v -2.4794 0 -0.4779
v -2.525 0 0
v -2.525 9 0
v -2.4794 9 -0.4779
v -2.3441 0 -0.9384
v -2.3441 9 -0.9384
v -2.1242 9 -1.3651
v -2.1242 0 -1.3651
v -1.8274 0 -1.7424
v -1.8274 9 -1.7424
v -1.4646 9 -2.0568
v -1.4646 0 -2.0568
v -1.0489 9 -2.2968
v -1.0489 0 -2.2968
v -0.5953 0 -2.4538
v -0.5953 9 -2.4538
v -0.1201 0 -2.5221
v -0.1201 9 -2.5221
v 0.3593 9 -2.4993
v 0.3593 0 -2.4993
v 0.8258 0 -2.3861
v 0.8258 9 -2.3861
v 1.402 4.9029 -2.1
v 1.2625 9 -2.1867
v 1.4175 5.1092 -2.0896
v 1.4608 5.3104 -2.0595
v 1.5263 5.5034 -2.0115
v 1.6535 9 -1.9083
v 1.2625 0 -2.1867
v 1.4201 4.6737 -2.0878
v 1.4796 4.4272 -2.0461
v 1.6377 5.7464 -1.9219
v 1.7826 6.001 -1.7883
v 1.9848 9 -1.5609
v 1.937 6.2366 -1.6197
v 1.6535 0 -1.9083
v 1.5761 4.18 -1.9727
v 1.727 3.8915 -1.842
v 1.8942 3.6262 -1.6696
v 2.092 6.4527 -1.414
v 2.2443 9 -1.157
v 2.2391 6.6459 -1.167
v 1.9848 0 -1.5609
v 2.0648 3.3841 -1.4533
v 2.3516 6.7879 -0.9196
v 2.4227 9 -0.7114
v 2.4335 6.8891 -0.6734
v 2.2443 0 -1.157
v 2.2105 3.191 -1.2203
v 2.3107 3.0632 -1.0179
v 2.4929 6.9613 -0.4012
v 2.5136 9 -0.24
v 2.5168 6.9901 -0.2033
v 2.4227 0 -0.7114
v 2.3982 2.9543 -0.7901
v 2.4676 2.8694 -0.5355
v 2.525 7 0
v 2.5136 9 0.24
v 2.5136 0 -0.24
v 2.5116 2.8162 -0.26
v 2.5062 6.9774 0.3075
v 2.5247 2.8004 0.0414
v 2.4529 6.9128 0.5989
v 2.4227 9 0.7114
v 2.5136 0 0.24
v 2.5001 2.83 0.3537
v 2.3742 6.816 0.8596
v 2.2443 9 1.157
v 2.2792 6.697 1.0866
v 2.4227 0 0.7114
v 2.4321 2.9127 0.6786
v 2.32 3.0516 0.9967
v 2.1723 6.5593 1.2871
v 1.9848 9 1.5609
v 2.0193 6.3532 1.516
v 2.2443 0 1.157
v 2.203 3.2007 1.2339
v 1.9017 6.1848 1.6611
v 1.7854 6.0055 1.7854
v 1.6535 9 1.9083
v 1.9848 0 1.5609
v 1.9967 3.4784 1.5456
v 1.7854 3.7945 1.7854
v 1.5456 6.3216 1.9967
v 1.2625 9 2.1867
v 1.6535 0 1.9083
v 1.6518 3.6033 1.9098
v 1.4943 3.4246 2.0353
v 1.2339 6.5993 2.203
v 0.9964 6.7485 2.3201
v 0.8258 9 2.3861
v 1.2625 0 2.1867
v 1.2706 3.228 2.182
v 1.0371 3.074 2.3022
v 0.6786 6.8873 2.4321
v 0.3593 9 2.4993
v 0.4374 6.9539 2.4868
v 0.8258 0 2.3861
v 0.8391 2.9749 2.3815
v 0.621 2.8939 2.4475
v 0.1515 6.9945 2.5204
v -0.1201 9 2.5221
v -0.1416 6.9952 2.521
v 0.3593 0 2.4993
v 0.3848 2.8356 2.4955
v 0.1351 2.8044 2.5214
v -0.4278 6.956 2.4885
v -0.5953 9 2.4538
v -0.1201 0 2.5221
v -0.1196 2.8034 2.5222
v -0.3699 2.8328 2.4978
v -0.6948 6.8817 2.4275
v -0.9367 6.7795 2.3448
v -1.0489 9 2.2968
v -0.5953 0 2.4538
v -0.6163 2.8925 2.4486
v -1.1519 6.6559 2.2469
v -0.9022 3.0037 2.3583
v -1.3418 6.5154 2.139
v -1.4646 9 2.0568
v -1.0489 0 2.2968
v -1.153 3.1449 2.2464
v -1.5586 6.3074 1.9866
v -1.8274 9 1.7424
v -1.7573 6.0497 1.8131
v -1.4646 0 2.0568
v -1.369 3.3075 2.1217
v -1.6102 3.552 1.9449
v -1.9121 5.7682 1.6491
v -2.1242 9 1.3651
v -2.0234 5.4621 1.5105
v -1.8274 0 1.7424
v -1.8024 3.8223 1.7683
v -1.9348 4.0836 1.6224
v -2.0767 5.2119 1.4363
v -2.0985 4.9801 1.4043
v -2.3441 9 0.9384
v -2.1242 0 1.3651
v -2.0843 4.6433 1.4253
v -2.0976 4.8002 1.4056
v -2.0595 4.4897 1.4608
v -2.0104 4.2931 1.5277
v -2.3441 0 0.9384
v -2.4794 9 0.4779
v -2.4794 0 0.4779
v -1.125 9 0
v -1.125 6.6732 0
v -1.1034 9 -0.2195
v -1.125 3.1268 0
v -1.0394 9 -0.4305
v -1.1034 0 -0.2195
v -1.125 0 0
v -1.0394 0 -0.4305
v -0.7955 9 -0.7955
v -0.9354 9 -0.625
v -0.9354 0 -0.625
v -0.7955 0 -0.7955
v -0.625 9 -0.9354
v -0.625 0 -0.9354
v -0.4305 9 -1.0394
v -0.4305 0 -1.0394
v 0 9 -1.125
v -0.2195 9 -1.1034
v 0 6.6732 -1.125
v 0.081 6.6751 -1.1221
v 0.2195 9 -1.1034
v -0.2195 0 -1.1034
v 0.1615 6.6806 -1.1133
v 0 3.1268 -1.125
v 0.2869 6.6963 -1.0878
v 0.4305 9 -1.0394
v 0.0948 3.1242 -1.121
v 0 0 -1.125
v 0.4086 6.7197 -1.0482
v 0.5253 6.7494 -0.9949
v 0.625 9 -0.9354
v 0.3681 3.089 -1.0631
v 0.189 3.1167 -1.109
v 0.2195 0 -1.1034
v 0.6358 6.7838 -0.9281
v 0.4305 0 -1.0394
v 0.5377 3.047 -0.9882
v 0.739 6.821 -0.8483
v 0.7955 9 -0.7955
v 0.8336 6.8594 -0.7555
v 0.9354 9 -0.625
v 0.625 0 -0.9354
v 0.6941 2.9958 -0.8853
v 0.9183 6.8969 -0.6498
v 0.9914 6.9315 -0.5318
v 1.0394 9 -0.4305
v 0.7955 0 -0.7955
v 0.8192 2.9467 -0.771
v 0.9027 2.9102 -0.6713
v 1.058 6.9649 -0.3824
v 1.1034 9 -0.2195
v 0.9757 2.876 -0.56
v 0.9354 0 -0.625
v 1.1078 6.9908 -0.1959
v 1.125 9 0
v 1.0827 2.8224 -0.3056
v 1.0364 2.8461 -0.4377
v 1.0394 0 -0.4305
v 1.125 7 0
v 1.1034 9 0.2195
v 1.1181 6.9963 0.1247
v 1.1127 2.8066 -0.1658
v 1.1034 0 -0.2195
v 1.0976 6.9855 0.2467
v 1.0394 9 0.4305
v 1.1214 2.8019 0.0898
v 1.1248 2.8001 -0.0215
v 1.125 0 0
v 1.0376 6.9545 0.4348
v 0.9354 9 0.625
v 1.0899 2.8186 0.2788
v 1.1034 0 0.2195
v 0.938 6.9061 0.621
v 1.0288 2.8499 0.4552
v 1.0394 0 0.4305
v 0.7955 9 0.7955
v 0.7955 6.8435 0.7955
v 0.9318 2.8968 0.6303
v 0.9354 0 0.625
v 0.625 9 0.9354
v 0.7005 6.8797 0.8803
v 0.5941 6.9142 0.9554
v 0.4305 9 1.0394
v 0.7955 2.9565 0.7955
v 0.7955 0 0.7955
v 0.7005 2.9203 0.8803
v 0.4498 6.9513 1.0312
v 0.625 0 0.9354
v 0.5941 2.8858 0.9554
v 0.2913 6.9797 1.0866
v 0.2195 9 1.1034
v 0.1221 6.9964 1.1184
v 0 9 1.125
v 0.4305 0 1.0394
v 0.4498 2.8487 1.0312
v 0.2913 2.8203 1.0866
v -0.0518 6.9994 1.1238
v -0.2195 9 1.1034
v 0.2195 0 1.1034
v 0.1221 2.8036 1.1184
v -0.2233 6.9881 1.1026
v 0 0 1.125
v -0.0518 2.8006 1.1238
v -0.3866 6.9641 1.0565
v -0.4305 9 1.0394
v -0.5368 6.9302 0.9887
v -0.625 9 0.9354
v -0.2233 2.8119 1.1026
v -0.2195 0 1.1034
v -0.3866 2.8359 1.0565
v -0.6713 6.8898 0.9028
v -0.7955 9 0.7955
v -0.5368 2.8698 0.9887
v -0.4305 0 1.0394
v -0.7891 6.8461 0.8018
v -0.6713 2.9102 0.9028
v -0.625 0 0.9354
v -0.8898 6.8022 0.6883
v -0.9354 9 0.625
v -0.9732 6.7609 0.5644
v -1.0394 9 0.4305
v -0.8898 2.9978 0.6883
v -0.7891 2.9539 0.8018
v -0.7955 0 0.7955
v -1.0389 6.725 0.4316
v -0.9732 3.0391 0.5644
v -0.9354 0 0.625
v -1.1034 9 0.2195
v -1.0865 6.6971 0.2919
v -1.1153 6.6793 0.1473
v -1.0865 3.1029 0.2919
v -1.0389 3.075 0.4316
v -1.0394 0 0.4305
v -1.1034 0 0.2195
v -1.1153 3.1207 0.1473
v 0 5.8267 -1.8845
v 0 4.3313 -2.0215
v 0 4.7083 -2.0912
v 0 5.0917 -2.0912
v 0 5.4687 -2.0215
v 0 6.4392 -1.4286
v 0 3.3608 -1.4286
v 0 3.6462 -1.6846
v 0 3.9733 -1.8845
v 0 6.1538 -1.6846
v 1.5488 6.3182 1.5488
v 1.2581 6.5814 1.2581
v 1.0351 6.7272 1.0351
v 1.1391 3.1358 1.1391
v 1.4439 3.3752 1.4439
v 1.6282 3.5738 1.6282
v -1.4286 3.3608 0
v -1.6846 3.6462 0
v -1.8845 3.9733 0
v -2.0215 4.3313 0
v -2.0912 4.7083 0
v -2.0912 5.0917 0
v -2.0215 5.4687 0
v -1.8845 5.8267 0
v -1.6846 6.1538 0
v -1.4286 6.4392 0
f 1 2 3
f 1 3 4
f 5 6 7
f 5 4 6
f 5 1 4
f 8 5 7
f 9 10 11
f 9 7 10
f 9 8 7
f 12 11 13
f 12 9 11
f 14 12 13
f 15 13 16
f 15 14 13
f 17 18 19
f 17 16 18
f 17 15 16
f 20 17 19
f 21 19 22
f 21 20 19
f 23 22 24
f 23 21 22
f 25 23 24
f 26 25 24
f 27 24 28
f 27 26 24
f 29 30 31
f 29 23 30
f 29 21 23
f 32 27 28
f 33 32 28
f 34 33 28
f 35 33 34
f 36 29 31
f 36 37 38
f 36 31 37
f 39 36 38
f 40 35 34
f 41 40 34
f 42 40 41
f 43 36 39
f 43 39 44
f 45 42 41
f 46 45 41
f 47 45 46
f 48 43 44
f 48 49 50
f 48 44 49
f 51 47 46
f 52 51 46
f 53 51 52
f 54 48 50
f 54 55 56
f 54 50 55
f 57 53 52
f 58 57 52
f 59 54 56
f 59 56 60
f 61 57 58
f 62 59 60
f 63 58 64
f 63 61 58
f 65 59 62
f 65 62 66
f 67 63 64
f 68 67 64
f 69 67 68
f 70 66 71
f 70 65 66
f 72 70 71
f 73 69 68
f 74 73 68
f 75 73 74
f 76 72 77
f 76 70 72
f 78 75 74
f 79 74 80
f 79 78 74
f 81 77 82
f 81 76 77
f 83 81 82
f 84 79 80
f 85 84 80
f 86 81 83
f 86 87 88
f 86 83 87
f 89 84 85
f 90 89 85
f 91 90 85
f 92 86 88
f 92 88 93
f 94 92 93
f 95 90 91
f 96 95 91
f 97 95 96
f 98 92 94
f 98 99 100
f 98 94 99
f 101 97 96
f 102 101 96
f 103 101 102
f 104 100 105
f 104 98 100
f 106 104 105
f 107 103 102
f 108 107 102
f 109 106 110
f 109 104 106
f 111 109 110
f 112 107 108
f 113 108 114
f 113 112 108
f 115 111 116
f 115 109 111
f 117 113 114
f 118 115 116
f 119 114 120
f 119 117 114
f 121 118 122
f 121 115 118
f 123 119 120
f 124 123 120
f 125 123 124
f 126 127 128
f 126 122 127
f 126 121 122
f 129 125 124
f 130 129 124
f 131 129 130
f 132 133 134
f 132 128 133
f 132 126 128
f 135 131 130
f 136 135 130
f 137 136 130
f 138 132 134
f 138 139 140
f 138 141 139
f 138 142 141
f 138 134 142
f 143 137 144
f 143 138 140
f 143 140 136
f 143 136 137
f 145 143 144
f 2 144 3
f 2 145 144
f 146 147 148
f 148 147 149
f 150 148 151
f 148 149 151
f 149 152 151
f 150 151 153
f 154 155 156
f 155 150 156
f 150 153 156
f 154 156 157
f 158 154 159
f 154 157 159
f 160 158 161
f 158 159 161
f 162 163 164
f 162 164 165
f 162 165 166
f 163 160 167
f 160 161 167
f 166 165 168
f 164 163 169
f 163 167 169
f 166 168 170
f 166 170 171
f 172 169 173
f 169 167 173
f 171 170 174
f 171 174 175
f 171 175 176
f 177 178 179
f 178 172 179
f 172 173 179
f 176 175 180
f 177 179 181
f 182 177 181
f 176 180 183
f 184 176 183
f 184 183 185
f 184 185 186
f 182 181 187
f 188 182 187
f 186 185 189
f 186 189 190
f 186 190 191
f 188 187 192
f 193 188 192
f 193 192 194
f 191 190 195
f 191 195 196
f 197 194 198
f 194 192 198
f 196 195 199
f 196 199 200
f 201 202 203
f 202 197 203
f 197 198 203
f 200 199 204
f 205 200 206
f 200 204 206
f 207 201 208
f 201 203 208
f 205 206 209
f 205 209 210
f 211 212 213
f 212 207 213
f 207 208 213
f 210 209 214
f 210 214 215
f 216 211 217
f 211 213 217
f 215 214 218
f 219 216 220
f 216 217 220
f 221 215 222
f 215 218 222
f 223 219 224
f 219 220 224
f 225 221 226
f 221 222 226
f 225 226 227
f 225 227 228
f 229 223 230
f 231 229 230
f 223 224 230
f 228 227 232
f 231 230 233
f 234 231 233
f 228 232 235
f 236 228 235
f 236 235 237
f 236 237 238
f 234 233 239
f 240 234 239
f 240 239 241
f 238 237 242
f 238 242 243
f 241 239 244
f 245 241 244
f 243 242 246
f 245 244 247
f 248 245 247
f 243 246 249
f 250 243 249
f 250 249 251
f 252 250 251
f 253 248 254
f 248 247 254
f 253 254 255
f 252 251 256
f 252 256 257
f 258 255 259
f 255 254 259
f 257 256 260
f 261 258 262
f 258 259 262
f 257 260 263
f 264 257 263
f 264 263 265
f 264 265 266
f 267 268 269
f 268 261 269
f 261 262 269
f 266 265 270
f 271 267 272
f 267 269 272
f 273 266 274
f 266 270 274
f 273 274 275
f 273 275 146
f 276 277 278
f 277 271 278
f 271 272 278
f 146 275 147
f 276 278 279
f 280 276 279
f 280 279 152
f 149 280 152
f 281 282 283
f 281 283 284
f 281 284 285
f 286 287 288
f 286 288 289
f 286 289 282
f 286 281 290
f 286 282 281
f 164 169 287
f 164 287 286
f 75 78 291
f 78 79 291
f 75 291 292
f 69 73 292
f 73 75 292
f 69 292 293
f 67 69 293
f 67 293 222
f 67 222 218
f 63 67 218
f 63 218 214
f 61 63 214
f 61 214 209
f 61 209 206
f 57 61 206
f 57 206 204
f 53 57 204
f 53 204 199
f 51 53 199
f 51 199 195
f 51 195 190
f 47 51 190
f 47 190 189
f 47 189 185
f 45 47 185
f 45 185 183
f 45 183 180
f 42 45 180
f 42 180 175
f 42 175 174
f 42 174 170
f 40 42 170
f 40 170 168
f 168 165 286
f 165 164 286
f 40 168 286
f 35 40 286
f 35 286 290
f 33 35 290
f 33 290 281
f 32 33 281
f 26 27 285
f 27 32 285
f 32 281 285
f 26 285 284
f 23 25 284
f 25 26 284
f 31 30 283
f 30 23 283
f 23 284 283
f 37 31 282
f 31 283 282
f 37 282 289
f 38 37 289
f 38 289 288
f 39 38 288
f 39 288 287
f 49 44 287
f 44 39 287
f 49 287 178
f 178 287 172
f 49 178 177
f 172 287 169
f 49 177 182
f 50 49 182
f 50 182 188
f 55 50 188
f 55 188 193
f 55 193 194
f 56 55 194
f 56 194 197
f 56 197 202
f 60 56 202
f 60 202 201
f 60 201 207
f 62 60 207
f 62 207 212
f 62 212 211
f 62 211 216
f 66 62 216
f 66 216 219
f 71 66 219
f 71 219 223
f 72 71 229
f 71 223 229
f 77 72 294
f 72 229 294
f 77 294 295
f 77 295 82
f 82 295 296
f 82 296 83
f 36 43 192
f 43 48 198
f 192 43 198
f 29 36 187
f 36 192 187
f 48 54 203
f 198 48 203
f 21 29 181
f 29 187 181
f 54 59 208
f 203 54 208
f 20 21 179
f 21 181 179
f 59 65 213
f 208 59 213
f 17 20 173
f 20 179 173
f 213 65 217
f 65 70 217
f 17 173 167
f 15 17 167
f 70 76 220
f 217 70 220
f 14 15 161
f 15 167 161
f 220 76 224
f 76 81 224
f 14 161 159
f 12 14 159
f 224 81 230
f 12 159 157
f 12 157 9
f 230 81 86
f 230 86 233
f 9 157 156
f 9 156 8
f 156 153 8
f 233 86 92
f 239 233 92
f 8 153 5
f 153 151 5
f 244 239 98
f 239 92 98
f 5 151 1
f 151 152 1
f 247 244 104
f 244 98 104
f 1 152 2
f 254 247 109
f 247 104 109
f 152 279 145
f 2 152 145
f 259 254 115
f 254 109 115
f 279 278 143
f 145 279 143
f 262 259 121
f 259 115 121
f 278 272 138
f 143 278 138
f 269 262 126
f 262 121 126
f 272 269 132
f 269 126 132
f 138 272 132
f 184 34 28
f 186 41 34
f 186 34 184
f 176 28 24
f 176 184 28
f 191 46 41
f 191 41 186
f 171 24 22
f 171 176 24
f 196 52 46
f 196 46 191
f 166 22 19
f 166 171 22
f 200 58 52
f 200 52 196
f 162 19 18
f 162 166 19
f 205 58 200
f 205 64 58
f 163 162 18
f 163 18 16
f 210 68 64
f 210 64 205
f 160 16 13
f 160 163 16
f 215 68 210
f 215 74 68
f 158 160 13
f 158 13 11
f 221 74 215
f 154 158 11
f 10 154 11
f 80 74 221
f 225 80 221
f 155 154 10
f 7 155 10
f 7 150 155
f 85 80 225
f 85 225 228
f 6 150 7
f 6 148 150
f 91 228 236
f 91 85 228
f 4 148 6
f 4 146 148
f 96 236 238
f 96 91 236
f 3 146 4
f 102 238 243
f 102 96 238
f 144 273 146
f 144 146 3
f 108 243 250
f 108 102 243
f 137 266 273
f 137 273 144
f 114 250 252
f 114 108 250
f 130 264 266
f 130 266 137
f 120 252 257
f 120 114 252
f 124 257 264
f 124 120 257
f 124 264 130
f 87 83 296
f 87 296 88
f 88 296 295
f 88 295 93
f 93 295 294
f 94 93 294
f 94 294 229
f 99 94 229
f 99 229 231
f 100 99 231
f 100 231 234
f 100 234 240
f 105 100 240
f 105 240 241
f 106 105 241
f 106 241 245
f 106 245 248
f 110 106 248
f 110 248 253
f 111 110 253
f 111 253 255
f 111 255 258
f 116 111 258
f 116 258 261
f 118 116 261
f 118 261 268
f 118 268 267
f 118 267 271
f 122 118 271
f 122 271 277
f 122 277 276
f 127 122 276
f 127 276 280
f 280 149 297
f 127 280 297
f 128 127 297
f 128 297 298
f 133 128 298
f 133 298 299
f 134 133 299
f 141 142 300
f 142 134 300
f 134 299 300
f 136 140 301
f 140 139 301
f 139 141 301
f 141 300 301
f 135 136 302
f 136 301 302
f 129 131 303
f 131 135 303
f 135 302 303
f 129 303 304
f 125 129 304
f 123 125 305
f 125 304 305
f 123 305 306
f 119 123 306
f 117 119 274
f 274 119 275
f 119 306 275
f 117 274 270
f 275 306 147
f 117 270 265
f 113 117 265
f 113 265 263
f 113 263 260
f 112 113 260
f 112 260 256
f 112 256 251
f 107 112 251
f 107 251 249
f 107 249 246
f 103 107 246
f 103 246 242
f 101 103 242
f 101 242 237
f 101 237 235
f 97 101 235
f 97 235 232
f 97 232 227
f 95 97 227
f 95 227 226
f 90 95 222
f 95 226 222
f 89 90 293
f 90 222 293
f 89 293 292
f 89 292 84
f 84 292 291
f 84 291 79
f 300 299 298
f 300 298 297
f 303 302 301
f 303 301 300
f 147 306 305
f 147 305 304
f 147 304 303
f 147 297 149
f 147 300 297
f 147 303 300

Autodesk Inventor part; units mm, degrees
ref_plane "YZ Plane" through (0, 0, 0) normal (1, 0, 0) x (0, 1, 0)
ref_plane "XZ Plane" through (0, 0, 0) normal (0, 1, 0) x (-1, 0, 0)
ref_plane "XY Plane" through (0, 0, 0) normal (0, 0, 1) x (1, 0, 0)
sketch "Sketch1" plane through (0, 0, 0) normal (0, 1, 0) x (-1, 0, 0)
  circle A0 centre (0, 0) radius 1.125
  circle A1 centre (0, 0) radius 2.525
  dimension "d0" = 2.25
  dimension "d1" = 5.05
extrude "Extrusion1" add sketch "Sketch1" along normal blind 9
sketch "Sketch2" plane through (0, 0, 0) normal (0, 0, 1) x (1, 0, 0)
  line L0 (2.525, 9) -> (-2.525, 9) projected
  line L1 (2.525, 0) -> (-2.525, 0) projected
  line L2 (-2.525, 0) -> (-2.525, 9) projected
  line L3 (-2.525, 7) -> (2.5173, 7)
  line L4 (2.525, 9) -> (-2.525, 9) projected
  line L5 (0, 9) -> (0, 0)
  circle A0 centre (0, 4.9) radius 2.1
  dimension "d4" = 2
  dimension "d5" = 4.2
extrude "Extrusion2" cut sketch "Sketch2" along normal blind 12 contours A0 L5 | L5 A0
sketch "Sketch3" plane through (0, 0, 0) normal (1, 0, 0) x (0, 1, 0)
  line L0 (9, -2.525) -> (9, 2.525) projected
  line L1 (0, -2.525) -> (0, 2.525) projected
  line L2 (0, 2.525) -> (9, 2.525) projected
  line L3 (7, 2.525) -> (7, -2.525)
  line L4 (9, 1.125) -> (9, -1.125) projected
  line L5 (9, 0) -> (0, 0)
  circle A0 centre (4.9, 0) radius 2.1
  point P0 (4.9, 1.402)
  dimension "d8" = 2
  dimension "d9" = 4.2
extrude "Extrusion3" cut sketch "Sketch3" along normal up to next contours A0 L5 | L5 A0
properties part number "motor_shaft_adapter" material "ABS Plastic"
